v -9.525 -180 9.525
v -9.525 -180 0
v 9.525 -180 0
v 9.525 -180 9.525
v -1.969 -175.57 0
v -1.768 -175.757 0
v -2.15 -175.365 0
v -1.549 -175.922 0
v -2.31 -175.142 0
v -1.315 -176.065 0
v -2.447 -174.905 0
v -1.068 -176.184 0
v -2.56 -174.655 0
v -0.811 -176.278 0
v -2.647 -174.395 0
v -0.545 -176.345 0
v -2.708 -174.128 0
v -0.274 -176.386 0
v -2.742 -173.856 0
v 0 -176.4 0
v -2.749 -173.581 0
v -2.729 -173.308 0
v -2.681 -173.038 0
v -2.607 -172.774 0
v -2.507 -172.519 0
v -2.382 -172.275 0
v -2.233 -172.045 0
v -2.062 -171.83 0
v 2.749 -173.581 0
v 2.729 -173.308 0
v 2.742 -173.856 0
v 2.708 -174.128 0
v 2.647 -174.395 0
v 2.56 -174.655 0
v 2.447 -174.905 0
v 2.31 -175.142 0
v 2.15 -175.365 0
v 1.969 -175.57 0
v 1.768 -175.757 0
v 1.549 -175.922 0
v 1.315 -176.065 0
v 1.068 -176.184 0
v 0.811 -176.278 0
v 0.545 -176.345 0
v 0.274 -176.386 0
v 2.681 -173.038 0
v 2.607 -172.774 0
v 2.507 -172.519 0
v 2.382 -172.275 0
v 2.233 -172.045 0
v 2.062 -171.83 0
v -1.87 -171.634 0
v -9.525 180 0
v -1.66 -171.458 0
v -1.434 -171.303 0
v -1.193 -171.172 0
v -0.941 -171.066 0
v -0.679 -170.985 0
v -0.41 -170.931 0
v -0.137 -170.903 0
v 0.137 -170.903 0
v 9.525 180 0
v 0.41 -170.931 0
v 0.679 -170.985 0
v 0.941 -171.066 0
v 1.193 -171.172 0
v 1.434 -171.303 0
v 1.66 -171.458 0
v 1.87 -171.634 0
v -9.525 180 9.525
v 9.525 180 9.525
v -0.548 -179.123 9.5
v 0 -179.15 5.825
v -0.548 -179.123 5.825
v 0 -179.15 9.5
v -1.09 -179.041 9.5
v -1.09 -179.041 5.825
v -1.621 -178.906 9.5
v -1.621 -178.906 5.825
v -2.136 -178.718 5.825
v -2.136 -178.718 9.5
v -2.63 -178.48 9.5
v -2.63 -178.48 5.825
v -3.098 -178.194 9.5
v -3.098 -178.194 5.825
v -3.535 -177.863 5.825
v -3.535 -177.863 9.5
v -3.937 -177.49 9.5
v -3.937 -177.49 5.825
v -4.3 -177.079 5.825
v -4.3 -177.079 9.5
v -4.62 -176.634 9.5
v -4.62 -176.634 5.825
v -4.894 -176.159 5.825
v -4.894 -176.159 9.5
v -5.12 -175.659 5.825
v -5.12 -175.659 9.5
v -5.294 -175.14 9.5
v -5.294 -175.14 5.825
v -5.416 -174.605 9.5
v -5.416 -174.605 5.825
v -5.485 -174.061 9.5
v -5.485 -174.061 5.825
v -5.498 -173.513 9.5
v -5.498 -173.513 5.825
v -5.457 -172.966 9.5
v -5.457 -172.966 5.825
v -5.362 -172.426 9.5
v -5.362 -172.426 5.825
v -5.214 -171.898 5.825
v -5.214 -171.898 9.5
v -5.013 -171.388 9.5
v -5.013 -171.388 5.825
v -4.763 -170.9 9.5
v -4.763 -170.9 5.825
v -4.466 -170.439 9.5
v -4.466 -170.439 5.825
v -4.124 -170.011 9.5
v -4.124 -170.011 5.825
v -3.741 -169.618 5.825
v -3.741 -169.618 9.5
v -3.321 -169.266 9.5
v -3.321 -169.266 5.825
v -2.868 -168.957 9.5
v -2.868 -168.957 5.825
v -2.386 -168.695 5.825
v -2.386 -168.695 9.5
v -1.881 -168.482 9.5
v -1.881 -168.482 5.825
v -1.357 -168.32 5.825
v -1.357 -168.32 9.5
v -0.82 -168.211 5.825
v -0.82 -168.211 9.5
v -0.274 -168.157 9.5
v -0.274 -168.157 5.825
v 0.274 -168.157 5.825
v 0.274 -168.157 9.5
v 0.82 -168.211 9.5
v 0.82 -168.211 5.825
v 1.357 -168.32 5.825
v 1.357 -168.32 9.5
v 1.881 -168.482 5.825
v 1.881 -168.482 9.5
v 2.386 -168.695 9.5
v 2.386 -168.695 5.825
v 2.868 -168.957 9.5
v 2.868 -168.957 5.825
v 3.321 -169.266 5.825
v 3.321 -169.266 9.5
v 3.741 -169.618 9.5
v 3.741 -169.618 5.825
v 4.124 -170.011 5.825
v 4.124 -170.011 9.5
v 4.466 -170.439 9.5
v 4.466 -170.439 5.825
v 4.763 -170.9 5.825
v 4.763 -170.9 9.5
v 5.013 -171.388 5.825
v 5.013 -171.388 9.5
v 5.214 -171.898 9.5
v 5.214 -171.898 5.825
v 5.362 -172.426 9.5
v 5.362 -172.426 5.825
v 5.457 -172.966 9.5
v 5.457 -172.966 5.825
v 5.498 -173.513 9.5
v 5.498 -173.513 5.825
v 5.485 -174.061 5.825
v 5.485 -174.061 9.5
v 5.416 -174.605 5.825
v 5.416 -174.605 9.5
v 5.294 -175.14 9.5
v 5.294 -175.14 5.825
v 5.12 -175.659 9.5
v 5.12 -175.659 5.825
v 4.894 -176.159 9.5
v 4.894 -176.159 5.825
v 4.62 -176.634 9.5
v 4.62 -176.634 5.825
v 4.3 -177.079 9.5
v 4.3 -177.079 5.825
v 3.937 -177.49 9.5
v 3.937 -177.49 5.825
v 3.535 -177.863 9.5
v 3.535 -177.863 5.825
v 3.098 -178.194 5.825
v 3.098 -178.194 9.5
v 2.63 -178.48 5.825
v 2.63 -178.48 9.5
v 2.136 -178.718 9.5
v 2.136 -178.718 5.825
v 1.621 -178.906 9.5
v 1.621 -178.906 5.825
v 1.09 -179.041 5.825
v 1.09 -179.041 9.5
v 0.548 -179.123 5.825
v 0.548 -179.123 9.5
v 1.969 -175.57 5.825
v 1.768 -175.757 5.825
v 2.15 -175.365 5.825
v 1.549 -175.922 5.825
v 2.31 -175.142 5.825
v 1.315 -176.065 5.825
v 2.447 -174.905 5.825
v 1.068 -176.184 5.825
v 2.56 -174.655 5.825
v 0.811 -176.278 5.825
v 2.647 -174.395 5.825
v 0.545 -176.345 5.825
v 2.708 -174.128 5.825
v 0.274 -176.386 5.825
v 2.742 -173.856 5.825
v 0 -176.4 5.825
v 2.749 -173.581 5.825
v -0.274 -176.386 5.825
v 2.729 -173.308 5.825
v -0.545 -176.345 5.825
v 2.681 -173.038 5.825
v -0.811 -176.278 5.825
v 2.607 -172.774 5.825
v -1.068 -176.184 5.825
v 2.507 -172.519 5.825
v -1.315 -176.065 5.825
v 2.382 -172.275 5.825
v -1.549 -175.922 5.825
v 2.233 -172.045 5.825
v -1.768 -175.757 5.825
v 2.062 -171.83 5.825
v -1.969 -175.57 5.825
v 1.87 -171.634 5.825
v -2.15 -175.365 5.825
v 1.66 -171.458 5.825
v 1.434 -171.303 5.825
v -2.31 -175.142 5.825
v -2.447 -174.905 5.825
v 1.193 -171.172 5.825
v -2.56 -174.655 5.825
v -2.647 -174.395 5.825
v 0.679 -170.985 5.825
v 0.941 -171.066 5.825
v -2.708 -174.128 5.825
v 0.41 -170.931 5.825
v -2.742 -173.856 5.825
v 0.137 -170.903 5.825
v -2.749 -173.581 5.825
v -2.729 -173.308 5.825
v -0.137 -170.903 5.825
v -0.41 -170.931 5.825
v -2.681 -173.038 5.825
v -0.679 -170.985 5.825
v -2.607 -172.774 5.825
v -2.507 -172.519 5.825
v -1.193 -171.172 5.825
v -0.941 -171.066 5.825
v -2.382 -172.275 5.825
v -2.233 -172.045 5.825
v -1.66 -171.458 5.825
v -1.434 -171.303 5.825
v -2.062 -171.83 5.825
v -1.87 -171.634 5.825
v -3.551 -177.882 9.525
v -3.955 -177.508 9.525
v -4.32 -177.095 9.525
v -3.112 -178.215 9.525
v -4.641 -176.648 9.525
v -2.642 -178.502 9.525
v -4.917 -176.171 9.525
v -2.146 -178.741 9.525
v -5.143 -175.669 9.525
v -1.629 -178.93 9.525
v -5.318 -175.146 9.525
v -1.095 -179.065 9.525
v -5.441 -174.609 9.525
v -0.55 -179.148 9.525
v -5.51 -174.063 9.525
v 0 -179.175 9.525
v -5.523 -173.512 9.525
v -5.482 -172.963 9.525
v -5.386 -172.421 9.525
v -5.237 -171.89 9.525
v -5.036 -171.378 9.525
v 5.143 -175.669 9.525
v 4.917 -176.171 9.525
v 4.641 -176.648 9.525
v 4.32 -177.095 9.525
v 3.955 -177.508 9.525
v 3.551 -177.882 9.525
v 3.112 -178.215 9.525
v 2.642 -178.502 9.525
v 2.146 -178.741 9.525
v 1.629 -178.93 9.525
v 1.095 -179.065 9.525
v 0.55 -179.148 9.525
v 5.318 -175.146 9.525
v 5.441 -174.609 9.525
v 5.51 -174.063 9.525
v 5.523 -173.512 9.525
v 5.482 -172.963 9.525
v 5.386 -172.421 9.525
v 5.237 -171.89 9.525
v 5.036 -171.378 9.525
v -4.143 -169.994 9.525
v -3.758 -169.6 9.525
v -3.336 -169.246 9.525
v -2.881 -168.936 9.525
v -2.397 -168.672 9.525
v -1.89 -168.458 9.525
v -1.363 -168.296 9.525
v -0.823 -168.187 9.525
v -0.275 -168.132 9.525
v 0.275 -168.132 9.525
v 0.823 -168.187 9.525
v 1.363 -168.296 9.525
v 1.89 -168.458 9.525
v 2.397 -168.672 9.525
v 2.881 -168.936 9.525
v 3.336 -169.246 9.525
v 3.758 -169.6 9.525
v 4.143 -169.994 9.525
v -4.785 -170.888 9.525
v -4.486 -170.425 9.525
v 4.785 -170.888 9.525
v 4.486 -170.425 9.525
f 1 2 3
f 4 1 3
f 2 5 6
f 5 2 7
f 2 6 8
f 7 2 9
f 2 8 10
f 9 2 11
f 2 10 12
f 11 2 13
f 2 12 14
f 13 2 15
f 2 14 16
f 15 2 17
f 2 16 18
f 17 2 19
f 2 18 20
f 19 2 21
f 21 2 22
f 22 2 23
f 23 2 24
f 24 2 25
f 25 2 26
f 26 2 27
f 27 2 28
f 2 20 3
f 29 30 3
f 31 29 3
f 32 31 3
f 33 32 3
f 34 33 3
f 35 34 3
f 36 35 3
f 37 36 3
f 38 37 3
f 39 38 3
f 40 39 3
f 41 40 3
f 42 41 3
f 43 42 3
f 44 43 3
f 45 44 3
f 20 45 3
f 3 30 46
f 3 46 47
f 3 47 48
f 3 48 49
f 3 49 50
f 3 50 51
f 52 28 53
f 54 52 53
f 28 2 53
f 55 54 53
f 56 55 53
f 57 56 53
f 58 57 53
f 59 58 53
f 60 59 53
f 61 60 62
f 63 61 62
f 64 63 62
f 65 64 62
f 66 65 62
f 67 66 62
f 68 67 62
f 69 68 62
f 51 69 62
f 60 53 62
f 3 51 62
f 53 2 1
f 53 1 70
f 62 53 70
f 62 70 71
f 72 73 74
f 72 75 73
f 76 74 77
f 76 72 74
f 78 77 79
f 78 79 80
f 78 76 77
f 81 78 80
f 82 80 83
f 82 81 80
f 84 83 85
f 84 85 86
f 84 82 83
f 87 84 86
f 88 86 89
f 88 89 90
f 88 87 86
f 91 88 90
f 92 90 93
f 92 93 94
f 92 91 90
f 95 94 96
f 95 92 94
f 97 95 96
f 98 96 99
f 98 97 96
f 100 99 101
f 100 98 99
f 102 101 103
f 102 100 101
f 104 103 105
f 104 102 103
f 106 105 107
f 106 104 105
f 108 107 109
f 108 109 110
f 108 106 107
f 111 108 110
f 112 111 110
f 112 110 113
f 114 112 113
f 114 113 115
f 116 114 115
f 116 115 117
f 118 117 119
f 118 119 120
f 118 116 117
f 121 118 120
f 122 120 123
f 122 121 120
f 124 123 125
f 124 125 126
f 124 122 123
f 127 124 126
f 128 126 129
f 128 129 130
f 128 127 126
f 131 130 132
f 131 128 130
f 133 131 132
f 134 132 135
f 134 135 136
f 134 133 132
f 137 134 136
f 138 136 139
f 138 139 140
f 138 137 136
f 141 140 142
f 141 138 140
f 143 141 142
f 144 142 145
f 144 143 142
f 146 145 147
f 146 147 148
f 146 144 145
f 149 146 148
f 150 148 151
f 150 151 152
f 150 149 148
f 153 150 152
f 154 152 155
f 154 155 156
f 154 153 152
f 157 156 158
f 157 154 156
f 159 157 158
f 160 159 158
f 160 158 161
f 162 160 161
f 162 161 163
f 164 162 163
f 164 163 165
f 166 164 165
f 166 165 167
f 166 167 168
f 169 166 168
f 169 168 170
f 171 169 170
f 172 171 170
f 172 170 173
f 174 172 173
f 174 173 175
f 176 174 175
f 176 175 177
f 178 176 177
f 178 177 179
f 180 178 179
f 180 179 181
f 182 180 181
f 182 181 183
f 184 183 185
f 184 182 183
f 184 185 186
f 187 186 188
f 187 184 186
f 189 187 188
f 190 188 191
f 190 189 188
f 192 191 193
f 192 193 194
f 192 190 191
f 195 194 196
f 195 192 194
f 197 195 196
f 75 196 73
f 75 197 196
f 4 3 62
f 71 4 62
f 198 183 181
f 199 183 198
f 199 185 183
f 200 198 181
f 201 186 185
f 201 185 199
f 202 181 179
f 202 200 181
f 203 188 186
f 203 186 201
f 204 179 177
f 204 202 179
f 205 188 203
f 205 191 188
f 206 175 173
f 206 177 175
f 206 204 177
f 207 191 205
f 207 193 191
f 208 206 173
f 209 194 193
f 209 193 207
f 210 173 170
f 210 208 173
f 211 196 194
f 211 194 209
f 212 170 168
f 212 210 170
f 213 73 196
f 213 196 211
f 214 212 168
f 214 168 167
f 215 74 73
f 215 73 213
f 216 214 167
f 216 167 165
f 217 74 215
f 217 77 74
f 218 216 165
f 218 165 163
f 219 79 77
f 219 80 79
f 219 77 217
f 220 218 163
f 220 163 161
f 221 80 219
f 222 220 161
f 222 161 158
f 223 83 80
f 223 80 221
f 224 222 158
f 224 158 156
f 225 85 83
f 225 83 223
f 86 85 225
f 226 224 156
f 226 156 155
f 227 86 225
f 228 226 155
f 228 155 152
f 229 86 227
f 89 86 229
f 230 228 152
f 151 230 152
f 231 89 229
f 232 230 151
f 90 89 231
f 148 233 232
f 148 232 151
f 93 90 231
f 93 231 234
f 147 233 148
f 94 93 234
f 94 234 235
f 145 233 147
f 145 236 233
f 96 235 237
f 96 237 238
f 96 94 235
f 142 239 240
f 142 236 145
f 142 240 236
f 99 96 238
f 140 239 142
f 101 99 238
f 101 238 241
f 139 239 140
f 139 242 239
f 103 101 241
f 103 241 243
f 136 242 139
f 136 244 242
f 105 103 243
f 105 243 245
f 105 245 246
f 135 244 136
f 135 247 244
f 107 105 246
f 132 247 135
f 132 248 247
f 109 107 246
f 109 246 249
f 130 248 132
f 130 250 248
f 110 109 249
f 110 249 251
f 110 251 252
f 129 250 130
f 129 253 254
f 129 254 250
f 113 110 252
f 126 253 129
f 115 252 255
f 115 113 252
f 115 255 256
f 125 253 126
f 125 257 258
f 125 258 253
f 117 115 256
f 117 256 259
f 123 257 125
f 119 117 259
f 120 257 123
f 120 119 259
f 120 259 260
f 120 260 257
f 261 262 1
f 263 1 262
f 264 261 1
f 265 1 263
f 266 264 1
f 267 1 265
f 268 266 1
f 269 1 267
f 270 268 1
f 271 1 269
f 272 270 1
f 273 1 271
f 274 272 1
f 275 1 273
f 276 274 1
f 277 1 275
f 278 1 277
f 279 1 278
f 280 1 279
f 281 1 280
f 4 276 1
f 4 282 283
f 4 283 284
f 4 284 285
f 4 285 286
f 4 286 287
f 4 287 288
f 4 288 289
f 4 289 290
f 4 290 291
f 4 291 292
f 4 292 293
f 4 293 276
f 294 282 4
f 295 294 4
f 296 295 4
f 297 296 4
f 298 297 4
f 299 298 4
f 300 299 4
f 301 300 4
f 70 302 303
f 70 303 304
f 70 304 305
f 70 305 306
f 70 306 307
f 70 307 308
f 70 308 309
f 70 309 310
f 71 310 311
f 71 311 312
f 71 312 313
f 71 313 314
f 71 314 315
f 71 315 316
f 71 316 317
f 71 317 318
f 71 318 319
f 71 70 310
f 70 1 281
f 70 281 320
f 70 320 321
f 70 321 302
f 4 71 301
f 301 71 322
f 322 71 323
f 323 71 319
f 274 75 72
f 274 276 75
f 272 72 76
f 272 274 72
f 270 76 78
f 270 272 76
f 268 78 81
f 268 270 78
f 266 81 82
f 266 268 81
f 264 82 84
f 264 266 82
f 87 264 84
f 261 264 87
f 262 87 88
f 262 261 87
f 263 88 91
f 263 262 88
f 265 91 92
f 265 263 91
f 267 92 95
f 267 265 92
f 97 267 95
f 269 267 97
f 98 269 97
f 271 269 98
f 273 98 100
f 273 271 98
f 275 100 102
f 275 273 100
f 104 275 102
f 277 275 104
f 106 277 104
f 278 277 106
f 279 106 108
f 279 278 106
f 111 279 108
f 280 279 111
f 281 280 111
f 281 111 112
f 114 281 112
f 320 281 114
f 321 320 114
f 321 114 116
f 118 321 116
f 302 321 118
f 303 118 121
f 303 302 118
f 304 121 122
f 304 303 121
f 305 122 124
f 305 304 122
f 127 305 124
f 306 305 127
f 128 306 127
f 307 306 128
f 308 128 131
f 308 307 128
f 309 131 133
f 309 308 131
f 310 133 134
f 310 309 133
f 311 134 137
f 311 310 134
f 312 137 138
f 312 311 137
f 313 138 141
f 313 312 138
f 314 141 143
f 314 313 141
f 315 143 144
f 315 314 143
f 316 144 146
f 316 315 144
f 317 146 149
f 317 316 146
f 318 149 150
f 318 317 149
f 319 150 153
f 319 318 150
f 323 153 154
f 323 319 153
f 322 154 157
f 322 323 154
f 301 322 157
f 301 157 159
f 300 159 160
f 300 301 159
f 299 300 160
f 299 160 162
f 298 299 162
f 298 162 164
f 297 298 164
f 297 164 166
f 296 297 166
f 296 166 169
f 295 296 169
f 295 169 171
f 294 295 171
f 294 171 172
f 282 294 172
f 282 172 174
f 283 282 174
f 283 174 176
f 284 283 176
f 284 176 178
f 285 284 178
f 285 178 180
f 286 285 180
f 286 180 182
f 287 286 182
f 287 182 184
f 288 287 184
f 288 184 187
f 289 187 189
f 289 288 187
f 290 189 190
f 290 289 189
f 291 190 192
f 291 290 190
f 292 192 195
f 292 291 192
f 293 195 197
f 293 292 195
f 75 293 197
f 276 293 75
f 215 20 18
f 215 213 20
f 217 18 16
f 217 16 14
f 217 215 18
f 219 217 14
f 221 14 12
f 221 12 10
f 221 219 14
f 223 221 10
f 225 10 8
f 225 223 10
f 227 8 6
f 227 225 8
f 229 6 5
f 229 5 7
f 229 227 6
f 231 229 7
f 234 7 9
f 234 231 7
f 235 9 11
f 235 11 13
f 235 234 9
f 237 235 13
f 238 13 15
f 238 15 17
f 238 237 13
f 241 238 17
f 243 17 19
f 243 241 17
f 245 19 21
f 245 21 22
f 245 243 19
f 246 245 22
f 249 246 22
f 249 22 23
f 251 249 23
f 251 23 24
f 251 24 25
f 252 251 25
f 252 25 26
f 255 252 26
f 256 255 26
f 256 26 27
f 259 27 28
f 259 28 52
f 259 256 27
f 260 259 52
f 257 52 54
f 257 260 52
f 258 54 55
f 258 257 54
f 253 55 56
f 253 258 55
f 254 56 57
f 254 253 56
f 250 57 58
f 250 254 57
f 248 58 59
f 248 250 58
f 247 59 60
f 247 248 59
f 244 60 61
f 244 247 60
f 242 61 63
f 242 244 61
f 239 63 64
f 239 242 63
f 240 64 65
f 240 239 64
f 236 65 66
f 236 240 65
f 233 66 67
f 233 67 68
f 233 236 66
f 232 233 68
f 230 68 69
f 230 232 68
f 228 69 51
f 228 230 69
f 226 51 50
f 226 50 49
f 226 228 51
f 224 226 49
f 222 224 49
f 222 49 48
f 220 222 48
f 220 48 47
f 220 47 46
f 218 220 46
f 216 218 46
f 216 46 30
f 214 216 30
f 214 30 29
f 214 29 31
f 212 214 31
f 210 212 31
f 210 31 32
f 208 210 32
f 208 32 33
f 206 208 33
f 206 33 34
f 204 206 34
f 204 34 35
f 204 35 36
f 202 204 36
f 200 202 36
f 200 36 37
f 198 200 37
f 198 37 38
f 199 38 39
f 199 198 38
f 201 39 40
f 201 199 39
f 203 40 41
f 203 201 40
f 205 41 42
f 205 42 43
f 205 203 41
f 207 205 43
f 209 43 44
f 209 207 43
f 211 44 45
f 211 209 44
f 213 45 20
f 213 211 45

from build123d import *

# Parameters (mm, degrees)
ESBO_O1_W                = 19.05
ESBO_O1_H                = 360
RESSALTO_EXTRUS_O1_DEPTH = 9.525
ESBO_O3_R                = 2.5
CORTE_EXTRUS_O1_DEPTH    = 181.503327532


with BuildPart() as part:
    # Esboço1 → Ressalto-extrusão1 (new body)
    with BuildSketch(Plane.XY):
        Rectangle(ESBO_O1_W, ESBO_O1_H)
    extrude(amount=RESSALTO_EXTRUS_O1_DEPTH)

    # Esboço3 → Corte-extrusão1 (cut, through all)
    with BuildSketch(Plane.XY.offset(9.525)):
        with Locations((0, -173.65)):
            Circle(ESBO_O3_R)
    extrude(amount=-CORTE_EXTRUS_O1_DEPTH, mode=Mode.SUBTRACT)

    # Esboço5 → Rebaixo para parafuso com cabeça panela de M51 (revolve, cut)
    with BuildSketch(Plane(origin=(0, -173.65, 9.525), x_dir=(0, -1, 0), z_dir=(1, 0, 0))):
        Polygon((0, 0), (0, 9.525), (2.75, 9.525), (2.75, 3.7), (5.5, 3.7), (5.5, 0.025), (5.525, 0), align=None)
    revolve(axis=Axis((0, -173.65, 15.875), (0, 0, -1)), mode=Mode.SUBTRACT)


solid = part.part
